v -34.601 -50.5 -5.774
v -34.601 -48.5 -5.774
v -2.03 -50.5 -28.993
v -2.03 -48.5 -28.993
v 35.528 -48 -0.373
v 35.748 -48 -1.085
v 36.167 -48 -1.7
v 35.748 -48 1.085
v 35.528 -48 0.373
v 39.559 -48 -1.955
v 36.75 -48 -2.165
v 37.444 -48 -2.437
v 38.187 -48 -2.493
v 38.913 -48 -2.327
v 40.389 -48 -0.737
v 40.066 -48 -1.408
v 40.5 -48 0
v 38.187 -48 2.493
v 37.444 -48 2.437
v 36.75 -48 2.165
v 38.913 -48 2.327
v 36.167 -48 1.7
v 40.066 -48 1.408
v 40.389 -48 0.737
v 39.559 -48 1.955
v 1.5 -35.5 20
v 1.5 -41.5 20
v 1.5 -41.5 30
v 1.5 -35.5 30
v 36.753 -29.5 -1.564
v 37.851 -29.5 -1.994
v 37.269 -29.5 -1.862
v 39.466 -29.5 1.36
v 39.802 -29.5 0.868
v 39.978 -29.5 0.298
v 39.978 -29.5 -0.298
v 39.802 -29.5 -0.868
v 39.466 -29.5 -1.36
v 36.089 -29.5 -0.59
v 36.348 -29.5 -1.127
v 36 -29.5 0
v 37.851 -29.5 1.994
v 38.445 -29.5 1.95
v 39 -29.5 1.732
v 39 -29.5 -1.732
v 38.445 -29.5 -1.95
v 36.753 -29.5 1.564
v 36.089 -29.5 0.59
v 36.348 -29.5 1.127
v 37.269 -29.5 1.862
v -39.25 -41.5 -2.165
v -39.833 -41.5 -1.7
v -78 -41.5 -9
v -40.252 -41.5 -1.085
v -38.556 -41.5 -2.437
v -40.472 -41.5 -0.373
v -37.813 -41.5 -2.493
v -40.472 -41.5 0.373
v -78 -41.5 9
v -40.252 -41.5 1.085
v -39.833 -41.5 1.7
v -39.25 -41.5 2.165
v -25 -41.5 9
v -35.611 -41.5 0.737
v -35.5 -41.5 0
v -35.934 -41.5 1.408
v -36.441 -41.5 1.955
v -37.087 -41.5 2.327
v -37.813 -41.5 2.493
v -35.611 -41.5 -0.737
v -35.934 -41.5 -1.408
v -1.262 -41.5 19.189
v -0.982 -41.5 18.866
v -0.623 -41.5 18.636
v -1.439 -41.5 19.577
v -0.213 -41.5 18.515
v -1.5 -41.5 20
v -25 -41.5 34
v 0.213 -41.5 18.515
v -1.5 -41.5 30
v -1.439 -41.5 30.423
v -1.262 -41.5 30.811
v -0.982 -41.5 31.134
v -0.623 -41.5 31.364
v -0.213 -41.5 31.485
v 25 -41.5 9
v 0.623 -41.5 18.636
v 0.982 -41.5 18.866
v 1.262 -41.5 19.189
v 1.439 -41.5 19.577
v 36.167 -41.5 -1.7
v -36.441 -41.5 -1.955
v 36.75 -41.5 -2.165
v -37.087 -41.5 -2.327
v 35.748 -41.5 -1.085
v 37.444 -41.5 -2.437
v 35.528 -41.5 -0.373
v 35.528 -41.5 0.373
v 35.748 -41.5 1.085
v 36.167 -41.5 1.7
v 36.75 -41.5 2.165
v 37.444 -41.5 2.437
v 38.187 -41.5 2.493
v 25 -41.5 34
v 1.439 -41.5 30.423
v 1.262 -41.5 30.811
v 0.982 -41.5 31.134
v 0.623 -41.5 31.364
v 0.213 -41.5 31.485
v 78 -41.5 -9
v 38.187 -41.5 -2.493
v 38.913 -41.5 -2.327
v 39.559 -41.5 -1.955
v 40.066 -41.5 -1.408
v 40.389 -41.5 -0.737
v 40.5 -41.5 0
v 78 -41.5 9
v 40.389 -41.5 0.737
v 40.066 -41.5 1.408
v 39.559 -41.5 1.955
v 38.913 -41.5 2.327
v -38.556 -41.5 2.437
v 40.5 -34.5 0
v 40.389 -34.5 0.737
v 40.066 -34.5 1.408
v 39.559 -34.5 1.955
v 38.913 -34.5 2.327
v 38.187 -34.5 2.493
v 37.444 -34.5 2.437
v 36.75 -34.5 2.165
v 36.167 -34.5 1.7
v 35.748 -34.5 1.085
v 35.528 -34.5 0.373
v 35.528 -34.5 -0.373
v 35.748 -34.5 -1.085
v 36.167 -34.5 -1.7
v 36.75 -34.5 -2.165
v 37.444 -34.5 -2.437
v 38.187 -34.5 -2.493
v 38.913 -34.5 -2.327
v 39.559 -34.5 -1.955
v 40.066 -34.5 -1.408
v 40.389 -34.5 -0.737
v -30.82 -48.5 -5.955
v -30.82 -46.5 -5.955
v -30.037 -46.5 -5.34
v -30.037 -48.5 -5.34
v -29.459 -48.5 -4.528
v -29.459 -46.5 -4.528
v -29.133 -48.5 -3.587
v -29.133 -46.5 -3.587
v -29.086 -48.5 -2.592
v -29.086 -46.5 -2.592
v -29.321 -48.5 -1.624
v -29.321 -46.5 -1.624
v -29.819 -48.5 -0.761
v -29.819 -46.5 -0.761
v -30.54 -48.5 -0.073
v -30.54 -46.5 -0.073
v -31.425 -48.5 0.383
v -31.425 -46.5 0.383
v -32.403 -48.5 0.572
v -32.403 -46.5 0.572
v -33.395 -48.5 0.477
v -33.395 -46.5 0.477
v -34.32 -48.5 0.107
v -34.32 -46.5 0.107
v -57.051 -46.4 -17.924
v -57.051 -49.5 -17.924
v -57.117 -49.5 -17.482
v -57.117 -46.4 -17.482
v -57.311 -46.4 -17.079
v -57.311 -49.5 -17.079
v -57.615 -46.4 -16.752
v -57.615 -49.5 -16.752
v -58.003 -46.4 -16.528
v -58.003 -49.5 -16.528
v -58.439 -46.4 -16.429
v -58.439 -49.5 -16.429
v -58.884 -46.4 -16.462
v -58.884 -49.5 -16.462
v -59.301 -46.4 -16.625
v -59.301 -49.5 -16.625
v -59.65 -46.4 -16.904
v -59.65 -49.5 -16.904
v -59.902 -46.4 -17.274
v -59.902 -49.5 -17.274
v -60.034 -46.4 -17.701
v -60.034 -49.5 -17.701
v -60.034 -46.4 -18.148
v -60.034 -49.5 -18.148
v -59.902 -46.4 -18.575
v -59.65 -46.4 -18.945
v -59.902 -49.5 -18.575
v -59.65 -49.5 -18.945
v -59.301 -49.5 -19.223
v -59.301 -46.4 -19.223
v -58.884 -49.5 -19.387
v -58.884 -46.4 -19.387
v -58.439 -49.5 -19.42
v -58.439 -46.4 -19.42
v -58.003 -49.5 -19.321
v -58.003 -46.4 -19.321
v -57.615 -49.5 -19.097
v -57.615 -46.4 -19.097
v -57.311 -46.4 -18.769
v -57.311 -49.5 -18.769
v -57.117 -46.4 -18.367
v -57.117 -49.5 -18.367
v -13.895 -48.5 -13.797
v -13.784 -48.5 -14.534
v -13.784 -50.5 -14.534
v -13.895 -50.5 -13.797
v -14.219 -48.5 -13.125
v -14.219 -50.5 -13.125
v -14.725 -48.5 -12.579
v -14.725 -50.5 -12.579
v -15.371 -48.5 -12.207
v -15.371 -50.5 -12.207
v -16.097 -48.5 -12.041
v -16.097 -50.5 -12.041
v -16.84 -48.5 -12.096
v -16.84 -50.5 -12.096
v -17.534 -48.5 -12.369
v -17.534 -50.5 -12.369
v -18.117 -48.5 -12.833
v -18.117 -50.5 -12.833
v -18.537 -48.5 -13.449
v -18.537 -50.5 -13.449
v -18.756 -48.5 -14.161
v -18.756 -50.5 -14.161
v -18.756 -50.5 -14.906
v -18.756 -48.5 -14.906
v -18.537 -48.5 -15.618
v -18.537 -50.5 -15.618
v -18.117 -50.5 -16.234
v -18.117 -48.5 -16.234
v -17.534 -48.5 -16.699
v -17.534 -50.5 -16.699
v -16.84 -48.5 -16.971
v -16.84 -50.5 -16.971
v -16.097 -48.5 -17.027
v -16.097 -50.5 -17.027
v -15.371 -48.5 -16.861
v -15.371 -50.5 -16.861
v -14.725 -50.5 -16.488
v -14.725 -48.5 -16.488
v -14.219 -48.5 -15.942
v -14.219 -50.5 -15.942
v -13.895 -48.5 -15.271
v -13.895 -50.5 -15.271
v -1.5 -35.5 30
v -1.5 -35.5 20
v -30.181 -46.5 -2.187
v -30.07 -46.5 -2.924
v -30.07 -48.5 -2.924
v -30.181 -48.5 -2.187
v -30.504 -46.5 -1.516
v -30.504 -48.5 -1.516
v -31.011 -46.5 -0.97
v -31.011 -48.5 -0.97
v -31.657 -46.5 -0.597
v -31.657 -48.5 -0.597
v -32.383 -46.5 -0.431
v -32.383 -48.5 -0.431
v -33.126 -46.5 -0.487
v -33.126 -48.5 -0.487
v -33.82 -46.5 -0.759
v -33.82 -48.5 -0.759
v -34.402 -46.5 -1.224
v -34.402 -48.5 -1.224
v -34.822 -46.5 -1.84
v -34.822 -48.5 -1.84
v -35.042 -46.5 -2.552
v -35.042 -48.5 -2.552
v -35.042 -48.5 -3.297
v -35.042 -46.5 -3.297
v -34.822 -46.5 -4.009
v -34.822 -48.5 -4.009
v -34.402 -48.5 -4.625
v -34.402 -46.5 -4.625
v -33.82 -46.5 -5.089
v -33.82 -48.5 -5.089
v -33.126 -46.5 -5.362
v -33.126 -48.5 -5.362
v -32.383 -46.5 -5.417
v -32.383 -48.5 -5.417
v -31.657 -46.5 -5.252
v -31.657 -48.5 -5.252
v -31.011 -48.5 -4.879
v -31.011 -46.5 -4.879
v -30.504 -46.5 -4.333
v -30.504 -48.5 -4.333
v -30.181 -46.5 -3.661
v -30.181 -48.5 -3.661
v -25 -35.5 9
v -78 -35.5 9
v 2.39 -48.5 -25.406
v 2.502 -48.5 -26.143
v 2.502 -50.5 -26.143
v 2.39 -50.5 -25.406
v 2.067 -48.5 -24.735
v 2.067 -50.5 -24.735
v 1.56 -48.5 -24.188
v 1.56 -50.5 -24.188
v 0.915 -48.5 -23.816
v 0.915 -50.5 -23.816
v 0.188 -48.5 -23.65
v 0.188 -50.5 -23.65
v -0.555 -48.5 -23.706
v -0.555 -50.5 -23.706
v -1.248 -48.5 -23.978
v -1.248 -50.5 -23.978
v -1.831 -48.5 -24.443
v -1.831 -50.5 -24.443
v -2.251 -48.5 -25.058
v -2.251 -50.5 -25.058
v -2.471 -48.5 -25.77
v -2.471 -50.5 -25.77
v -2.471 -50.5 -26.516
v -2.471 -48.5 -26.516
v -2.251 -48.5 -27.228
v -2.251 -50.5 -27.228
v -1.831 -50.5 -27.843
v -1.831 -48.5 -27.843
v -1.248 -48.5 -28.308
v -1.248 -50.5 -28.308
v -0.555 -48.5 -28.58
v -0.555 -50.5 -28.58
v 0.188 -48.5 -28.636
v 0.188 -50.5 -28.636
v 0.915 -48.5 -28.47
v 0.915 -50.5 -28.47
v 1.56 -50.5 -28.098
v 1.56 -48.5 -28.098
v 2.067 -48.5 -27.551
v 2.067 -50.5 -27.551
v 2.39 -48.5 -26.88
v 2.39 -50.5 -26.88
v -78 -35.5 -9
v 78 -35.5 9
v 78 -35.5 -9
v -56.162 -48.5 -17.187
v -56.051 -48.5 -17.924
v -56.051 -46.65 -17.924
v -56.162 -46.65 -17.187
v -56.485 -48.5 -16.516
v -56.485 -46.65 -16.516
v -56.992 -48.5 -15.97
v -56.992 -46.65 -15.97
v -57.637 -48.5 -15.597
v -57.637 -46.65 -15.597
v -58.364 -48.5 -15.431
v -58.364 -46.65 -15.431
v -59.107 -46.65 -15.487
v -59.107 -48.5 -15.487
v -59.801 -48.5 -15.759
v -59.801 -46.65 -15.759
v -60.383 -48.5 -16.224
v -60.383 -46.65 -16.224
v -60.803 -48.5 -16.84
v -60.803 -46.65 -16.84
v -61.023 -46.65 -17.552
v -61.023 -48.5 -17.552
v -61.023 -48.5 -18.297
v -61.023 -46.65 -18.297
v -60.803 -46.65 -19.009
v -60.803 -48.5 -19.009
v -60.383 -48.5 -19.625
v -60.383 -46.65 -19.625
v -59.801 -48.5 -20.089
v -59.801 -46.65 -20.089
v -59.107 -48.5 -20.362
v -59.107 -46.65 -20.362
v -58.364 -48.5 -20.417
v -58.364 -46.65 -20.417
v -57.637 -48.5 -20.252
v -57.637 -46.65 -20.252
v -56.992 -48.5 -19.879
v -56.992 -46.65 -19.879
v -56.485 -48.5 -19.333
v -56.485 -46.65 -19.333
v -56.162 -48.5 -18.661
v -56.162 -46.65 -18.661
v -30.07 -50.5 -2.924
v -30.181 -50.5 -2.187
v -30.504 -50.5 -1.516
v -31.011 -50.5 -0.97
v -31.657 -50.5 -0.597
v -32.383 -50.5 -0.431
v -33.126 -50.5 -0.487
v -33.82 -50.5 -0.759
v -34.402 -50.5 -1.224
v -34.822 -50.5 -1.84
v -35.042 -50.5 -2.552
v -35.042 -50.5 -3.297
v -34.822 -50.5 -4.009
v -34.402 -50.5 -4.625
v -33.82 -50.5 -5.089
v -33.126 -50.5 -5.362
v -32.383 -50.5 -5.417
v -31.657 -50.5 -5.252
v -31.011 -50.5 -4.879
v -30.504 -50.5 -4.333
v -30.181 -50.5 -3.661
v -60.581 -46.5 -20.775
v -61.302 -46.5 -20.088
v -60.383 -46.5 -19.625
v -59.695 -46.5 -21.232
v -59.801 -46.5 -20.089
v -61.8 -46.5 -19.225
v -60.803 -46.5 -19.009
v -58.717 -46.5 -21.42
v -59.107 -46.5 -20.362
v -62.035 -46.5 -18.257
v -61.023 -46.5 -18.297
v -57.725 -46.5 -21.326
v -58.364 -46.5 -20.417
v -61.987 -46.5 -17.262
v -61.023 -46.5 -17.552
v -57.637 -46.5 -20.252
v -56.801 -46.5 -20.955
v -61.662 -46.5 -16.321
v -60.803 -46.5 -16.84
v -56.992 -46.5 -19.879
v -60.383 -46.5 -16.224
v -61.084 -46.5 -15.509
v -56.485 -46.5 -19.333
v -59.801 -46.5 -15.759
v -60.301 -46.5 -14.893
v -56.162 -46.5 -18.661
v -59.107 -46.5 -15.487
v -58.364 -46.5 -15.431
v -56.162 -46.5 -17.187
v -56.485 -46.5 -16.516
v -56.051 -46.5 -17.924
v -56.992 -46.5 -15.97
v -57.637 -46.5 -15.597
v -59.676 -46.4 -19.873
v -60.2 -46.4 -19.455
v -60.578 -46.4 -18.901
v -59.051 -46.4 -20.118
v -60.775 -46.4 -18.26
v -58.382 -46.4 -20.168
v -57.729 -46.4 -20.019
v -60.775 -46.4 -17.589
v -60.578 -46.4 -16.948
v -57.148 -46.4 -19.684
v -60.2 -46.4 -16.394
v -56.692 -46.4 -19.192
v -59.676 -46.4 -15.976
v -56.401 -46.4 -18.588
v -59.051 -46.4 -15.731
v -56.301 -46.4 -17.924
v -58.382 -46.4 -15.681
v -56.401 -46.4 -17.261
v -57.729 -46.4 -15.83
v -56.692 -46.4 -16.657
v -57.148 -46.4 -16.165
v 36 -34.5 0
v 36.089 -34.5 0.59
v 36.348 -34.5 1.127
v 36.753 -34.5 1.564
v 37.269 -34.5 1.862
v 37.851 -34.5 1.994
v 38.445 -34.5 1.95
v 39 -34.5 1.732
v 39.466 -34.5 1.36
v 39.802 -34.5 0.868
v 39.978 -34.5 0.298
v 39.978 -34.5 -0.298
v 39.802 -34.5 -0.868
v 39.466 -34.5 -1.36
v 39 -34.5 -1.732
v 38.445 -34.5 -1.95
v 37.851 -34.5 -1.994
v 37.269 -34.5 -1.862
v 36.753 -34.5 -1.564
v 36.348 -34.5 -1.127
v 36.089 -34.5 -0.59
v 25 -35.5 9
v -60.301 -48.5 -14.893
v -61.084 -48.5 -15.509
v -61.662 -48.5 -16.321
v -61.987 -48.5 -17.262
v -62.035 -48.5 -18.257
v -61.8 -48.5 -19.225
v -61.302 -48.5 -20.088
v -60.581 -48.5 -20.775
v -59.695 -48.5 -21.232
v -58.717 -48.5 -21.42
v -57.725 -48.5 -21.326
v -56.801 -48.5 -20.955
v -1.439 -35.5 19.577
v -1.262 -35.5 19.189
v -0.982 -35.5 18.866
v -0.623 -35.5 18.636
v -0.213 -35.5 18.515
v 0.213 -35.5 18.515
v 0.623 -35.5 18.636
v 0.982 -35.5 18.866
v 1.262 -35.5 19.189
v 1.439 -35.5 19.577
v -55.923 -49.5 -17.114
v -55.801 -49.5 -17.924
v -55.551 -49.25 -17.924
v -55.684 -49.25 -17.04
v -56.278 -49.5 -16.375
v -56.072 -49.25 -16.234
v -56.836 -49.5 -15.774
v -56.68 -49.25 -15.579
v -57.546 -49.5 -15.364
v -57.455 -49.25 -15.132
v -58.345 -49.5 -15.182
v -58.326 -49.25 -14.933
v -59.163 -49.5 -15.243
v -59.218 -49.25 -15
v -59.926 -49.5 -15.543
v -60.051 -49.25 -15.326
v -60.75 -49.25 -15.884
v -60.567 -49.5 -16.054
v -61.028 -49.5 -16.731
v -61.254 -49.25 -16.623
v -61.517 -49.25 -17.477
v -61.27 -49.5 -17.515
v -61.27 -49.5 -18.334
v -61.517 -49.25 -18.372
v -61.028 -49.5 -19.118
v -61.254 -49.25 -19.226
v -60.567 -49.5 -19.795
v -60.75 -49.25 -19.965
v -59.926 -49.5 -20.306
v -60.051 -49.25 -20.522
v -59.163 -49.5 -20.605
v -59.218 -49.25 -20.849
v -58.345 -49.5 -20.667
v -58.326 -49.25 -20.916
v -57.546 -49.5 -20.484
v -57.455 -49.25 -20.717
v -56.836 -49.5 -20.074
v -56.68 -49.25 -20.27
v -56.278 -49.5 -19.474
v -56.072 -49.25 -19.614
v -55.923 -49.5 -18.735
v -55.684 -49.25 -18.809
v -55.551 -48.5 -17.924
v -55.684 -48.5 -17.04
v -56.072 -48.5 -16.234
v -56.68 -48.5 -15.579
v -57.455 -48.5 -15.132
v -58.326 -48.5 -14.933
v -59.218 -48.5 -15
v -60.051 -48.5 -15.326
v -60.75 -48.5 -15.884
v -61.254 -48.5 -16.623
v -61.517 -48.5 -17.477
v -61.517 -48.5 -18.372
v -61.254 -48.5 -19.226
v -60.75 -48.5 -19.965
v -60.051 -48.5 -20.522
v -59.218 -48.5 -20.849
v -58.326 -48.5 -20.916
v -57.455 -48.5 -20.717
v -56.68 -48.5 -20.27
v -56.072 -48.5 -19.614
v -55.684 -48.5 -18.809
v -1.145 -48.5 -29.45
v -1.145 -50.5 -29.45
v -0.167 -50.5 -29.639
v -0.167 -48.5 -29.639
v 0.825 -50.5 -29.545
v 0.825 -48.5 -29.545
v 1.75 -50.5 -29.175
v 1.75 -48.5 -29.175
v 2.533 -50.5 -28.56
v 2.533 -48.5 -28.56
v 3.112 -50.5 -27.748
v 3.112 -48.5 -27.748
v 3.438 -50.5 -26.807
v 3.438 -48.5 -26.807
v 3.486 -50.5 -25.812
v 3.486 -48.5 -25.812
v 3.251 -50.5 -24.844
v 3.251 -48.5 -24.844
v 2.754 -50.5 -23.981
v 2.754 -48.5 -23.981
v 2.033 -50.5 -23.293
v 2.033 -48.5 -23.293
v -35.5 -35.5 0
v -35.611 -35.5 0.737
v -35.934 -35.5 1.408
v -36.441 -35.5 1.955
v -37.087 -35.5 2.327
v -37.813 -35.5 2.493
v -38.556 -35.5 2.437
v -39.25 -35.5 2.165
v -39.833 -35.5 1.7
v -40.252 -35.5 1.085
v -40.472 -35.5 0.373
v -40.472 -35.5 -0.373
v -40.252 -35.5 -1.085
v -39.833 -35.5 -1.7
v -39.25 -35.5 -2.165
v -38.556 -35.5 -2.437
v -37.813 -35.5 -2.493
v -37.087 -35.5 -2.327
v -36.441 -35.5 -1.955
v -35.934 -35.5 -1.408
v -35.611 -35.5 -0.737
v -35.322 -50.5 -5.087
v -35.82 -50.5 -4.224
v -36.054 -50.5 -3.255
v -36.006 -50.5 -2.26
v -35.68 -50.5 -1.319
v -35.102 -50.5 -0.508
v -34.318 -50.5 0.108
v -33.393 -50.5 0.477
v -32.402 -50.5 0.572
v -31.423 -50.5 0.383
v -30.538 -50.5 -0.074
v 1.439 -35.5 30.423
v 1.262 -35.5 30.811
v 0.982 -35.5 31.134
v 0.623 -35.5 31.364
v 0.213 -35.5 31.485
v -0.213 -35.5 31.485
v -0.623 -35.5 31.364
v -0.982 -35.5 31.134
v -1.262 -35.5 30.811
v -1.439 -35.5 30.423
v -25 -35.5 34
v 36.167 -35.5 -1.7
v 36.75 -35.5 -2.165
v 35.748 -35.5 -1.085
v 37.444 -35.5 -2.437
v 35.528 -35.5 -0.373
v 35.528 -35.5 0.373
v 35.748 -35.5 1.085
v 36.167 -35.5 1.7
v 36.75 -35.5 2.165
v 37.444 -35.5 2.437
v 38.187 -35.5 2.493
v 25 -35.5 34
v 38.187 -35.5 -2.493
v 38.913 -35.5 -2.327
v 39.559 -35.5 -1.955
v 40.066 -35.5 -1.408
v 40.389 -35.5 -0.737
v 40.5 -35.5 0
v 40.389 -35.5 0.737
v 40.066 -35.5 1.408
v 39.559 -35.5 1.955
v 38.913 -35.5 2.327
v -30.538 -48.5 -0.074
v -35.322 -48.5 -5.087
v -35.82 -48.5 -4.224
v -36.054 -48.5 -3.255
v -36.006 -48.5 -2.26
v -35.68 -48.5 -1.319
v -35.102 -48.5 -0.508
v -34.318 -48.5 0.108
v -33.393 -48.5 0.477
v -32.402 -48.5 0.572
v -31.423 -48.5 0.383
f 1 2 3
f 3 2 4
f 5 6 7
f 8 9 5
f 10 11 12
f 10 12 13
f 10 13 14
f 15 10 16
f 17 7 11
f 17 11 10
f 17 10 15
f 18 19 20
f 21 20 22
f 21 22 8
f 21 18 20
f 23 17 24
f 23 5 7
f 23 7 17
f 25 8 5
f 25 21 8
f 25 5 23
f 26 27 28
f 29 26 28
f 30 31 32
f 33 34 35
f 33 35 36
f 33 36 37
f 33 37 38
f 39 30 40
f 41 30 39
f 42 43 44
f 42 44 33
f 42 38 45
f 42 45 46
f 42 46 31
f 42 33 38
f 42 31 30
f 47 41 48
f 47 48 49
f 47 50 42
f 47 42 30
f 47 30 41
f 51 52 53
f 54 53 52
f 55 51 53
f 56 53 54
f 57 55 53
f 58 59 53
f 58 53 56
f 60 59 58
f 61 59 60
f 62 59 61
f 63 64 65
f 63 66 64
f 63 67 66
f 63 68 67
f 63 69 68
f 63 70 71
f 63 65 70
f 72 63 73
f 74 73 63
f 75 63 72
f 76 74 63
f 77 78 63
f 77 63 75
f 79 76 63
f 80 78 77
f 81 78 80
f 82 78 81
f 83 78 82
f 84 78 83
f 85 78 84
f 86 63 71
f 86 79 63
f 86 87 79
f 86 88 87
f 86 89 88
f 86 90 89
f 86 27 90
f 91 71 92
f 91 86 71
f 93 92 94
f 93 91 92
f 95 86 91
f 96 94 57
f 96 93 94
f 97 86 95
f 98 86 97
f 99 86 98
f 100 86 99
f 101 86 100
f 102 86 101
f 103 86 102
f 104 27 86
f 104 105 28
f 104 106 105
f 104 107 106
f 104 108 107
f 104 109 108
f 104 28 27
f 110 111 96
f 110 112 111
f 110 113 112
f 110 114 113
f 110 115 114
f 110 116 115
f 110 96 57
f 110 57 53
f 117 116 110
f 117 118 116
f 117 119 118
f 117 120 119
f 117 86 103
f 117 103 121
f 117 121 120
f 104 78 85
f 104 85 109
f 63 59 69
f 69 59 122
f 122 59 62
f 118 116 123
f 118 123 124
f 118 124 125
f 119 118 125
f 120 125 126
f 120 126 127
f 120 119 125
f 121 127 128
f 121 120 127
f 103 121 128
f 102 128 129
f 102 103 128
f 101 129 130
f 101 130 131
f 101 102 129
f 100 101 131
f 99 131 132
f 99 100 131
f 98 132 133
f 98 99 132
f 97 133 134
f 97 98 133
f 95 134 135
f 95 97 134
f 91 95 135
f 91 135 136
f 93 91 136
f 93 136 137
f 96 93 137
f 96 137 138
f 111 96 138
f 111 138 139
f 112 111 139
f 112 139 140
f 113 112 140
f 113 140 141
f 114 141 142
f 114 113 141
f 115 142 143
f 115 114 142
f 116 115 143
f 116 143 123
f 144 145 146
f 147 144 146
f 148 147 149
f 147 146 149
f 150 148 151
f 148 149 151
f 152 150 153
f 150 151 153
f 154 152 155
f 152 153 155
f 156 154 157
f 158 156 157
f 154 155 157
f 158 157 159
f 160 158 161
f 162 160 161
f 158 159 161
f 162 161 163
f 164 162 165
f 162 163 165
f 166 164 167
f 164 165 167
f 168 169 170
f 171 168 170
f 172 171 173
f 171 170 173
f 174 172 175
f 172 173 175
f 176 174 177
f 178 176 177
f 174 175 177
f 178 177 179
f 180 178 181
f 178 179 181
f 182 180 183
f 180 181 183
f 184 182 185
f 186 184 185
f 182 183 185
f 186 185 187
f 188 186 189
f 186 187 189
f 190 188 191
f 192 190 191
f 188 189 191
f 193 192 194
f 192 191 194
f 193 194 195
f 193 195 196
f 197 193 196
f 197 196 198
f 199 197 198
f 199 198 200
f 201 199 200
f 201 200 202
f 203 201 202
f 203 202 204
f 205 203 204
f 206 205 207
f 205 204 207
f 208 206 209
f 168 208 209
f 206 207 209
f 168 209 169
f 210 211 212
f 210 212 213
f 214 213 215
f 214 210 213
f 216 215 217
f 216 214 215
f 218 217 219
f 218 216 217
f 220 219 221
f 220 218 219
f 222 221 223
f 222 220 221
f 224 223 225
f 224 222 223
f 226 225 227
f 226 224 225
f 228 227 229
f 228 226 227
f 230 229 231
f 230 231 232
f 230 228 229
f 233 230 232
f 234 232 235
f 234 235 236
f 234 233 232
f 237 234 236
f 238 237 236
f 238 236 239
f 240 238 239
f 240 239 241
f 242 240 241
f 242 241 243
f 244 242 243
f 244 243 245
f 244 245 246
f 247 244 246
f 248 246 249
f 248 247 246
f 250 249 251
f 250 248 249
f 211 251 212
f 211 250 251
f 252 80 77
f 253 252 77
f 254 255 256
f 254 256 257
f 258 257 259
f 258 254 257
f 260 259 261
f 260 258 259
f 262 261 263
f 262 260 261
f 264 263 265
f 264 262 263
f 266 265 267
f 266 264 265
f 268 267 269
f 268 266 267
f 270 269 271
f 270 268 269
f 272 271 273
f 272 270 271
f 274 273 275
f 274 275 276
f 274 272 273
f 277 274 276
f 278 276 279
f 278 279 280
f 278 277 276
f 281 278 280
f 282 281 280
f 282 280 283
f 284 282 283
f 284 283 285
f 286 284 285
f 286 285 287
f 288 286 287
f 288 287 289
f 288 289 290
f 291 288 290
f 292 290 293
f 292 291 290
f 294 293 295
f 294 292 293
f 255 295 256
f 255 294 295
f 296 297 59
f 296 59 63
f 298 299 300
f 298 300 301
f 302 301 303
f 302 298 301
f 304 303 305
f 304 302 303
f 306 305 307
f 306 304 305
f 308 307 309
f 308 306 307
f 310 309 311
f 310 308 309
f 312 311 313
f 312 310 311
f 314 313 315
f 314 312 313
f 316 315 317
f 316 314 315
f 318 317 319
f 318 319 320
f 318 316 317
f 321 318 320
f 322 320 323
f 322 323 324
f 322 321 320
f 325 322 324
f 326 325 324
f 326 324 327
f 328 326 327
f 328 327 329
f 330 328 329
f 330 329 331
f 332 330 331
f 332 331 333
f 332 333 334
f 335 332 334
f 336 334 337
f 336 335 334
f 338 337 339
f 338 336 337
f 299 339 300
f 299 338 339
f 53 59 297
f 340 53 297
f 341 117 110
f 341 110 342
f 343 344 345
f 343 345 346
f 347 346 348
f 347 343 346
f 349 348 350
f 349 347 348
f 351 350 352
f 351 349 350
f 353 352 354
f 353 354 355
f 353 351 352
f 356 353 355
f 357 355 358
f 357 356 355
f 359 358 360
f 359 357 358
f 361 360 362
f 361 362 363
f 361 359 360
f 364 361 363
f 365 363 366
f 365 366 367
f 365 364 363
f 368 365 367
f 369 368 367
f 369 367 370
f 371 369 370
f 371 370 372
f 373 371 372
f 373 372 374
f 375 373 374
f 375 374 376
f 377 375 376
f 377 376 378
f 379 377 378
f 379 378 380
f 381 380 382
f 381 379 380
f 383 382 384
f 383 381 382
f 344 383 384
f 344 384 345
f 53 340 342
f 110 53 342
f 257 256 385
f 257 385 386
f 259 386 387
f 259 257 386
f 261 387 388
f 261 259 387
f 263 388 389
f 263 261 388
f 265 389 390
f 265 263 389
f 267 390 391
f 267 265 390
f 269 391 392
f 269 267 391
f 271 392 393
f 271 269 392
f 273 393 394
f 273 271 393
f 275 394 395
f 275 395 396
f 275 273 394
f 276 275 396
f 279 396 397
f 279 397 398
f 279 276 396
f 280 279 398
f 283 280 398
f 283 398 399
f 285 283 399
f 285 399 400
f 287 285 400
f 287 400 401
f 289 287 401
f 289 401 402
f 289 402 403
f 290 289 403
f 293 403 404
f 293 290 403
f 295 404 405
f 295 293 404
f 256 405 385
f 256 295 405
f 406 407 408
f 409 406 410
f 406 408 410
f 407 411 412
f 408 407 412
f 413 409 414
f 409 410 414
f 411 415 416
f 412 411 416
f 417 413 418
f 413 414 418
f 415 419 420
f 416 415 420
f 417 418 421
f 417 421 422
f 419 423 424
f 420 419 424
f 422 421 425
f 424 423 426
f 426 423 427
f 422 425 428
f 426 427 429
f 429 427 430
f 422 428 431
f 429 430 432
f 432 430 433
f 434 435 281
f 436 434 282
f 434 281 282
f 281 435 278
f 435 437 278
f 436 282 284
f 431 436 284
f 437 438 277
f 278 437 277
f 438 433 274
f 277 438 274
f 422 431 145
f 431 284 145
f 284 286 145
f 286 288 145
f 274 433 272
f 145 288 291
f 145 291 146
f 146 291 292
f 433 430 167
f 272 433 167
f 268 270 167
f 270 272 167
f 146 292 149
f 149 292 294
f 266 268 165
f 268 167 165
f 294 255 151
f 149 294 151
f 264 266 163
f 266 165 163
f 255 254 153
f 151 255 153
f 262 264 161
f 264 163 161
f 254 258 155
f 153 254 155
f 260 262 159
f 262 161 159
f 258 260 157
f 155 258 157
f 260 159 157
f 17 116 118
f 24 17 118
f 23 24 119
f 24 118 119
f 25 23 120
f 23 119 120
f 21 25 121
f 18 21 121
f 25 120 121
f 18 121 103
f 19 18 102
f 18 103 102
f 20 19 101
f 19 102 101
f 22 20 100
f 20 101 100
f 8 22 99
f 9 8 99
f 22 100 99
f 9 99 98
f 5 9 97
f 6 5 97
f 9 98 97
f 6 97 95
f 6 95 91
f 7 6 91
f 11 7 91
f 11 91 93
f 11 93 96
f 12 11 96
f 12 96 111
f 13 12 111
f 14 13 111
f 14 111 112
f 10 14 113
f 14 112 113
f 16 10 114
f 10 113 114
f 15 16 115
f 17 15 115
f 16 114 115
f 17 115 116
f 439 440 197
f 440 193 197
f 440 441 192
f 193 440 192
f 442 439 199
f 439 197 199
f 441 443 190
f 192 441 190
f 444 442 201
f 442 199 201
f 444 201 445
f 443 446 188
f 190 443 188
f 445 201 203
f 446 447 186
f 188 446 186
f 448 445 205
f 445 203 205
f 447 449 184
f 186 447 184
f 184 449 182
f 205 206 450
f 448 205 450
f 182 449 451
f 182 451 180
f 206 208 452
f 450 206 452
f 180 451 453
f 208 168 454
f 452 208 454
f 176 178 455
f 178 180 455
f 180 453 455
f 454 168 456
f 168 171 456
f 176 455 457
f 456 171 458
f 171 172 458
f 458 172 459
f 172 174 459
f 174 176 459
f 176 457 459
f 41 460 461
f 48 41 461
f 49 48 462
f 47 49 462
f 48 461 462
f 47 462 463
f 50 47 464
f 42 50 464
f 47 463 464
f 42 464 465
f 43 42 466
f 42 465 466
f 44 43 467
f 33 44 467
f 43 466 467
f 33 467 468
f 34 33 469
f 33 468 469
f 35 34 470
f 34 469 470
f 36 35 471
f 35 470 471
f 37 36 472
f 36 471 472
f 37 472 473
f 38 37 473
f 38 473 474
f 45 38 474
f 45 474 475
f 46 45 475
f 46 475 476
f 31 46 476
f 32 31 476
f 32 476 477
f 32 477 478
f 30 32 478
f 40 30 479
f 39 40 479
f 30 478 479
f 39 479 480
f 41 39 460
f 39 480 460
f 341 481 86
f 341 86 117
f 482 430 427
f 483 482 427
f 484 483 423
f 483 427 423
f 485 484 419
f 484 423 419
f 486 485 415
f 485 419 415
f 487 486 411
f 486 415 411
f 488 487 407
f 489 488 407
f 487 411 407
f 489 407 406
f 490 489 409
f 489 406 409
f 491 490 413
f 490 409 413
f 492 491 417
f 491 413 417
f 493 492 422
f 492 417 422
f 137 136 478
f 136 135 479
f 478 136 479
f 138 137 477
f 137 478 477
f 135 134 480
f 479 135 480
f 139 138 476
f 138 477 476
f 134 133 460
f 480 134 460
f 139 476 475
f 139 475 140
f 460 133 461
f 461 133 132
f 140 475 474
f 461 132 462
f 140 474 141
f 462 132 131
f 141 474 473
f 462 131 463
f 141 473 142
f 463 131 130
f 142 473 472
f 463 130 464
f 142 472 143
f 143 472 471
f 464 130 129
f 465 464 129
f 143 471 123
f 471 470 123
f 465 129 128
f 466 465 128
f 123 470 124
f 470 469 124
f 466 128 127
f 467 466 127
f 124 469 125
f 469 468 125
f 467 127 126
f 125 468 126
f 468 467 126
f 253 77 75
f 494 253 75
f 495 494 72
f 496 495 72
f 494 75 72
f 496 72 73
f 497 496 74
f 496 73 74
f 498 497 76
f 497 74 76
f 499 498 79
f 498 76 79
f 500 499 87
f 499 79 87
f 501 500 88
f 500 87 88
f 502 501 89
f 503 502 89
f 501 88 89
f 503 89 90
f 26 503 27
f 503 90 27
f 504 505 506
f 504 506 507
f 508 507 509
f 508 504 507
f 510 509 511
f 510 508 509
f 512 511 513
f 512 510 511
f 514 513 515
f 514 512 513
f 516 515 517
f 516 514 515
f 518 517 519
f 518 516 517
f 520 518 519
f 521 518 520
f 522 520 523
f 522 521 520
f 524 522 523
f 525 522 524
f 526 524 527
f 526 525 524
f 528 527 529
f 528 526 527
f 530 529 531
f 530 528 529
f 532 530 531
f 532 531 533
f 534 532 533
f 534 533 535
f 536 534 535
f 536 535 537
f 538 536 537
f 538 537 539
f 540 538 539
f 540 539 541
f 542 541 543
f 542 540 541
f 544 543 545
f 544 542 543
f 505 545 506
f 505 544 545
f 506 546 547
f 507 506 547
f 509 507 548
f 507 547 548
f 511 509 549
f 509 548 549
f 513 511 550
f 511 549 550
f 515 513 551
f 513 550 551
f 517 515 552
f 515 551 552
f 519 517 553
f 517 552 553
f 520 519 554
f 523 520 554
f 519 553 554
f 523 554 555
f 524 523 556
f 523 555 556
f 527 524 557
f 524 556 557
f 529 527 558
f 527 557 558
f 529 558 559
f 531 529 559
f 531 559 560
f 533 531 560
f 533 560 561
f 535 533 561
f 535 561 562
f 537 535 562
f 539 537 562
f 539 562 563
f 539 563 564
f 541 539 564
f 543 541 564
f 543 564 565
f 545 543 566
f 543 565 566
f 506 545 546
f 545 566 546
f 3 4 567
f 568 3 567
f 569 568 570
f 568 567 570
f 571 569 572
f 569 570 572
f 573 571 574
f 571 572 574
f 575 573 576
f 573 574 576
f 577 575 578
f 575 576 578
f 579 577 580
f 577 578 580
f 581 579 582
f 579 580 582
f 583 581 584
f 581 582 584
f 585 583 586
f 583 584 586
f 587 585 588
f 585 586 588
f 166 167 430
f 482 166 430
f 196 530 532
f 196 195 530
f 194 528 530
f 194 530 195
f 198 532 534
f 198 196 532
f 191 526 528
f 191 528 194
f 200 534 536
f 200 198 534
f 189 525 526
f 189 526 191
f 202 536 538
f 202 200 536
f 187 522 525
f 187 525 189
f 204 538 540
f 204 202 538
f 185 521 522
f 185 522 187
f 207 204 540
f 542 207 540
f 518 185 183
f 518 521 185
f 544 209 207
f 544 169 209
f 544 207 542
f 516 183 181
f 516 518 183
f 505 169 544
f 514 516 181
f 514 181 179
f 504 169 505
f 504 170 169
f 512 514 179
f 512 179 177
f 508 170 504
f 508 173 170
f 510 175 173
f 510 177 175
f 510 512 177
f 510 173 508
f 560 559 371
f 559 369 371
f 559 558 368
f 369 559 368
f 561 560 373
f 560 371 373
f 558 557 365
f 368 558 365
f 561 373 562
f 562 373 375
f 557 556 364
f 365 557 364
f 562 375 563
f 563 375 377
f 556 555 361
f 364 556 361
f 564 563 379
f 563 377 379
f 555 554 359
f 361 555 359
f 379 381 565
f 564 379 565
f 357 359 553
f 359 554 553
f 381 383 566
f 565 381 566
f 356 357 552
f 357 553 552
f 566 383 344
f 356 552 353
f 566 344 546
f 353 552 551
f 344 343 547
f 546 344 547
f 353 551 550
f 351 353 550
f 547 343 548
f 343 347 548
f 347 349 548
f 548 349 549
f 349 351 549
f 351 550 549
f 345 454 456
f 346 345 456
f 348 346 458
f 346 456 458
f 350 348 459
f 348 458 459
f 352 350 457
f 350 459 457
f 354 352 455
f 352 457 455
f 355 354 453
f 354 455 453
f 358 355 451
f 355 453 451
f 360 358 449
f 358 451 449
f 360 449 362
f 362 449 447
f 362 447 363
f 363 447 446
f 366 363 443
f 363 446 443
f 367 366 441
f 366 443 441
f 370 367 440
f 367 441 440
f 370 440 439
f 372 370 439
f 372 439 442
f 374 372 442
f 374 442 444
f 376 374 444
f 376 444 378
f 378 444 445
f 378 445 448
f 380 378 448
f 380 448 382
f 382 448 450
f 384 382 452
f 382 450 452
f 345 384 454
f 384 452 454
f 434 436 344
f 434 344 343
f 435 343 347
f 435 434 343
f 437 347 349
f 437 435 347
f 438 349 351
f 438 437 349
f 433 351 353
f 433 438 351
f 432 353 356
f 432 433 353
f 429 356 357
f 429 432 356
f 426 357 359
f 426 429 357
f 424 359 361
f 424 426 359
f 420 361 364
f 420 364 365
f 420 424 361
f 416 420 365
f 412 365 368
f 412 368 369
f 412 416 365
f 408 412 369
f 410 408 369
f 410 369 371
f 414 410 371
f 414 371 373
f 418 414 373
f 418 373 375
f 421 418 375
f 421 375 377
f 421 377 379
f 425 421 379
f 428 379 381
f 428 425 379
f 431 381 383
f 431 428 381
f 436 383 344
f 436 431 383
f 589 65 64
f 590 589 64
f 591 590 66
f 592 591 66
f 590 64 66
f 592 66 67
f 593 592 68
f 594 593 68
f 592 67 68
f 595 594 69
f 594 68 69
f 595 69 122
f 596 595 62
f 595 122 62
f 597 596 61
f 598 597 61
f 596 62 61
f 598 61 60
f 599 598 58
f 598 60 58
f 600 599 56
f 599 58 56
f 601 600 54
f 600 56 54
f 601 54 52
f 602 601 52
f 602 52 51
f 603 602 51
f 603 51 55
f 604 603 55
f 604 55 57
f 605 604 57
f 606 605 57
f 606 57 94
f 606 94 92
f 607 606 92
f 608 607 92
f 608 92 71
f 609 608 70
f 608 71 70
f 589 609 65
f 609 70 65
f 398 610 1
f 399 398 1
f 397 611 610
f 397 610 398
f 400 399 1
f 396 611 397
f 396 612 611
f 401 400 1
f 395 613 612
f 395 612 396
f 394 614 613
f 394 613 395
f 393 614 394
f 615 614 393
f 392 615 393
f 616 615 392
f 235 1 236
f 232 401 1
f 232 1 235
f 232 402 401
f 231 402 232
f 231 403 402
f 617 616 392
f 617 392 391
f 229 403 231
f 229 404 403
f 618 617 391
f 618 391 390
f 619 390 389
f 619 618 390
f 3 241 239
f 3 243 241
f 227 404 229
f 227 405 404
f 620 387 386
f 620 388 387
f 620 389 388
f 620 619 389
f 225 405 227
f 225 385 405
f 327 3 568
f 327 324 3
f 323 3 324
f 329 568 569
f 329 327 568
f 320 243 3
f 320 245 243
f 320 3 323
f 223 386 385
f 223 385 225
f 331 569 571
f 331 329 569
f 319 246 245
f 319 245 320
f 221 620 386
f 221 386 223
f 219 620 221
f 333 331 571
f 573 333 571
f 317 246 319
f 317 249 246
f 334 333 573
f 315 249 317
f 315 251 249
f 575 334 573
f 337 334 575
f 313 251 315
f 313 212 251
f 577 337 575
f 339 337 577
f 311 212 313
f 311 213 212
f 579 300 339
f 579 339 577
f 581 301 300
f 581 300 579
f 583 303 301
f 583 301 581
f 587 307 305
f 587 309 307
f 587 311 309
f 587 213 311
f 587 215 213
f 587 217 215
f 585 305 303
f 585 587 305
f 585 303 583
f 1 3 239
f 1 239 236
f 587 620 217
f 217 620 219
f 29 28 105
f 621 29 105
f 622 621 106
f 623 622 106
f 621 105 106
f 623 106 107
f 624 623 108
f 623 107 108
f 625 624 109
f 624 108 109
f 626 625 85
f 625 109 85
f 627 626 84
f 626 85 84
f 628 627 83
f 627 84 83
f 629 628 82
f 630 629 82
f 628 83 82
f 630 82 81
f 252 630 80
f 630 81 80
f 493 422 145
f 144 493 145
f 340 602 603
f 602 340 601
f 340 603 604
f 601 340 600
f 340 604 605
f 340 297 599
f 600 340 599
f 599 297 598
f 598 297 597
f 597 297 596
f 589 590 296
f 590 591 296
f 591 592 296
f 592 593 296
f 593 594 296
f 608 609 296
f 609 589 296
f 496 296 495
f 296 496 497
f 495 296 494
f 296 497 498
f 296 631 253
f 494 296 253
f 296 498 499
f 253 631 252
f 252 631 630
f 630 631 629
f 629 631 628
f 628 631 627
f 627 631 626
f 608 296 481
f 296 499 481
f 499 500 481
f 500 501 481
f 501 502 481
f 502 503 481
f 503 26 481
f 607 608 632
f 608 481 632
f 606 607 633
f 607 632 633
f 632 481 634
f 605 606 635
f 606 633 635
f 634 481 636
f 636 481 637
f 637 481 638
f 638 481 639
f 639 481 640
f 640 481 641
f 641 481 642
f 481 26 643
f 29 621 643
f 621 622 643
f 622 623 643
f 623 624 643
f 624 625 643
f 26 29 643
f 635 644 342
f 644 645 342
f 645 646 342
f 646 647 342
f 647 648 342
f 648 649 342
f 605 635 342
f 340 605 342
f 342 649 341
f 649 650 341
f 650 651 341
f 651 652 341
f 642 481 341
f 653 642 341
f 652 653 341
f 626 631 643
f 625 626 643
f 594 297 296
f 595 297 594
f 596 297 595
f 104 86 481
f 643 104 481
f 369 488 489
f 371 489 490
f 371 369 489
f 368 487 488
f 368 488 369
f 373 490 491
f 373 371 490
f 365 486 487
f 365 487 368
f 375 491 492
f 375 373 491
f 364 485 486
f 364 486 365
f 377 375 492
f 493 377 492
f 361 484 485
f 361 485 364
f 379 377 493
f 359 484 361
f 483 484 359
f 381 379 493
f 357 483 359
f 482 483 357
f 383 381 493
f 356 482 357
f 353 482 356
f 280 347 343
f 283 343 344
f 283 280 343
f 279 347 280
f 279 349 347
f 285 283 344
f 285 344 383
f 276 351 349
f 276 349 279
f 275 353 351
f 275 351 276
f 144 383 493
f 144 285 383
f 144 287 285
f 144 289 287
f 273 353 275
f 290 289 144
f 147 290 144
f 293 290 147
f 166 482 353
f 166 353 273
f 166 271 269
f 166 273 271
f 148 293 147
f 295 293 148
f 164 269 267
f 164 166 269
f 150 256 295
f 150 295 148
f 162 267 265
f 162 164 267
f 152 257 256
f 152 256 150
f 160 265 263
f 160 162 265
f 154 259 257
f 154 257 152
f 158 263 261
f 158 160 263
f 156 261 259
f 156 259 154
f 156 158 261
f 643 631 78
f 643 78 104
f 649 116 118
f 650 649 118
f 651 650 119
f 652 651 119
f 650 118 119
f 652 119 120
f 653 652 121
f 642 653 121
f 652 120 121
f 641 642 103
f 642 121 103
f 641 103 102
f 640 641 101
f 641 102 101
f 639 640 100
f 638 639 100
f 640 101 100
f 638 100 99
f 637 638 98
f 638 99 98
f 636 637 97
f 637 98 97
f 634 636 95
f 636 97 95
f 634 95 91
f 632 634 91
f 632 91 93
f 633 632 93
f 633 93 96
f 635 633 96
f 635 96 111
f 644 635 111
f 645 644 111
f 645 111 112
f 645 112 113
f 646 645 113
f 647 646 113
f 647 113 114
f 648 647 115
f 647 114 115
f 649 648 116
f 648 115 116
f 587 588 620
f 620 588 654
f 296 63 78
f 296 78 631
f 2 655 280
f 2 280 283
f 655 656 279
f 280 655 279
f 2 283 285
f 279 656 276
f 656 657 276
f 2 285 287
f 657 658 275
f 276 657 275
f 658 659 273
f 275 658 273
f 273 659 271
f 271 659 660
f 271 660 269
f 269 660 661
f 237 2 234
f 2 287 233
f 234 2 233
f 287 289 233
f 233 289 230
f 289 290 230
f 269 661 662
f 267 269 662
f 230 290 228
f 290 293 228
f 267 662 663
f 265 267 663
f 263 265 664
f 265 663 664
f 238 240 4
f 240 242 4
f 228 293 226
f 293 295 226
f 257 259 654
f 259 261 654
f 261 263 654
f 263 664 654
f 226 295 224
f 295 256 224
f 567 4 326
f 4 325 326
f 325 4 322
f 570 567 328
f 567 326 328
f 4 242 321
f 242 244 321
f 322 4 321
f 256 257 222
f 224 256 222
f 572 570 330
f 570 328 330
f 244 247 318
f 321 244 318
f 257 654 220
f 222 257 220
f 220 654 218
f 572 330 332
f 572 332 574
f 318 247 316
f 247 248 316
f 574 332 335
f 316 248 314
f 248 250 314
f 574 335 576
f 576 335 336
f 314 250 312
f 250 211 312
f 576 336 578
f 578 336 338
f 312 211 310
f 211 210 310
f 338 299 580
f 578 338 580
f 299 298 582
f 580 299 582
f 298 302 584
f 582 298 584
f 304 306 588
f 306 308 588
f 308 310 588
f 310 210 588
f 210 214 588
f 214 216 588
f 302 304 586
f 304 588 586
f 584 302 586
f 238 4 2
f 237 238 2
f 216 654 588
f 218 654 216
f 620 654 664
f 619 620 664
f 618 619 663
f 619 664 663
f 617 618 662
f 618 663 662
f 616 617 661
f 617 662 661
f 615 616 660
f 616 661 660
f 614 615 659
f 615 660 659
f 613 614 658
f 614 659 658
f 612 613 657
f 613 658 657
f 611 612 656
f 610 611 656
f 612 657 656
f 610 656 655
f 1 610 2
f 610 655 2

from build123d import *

# Parameters (mm, degrees)
F0_W      = 156
F0_H      = 6
F1_DEPTH  = 9
F2_R      = 2.5
F3_DEPTH  = 6
F5_R      = 2.5
F6_DEPTH  = 7
F7_R      = 2
F8_DEPTH  = 5
F9_R      = 2.5
F10_DEPTH = 6.5
F11_W     = 50
F11_H     = 6
F12_DEPTH = 25
F14_DEPTH = 6
F15_R     = 2.5
F16_DEPTH = 2
F17_R     = 2.5
F18_DEPTH = 2
F20_R     = 2.5
F21_DEPTH = 2.1
F22_R     = 3
F23_DEPTH = 1
F24_R     = 1.5
F25_DEPTH = 3.1
F26_SIZE  = 0.25


with BuildPart() as f1:
    # F0 (on Top) → F1 (new body, symmetric)
    with BuildSketch(Plane.XY):
        with Locations((0, -38.5)):
            Rectangle(F0_W, F0_H)
    extrude(amount=F1_DEPTH, both=True)

    # F2 (on face) → F3 (cut, through all)
    with BuildSketch(Plane.XZ.offset(41.5)):
        with Locations((-38, 0)):
            Circle(F2_R)
        with Locations((38, 0)):
            Circle(F2_R)
    extrude(amount=-F3_DEPTH, mode=Mode.SUBTRACT)

    # F11 (on face) → F12 (join)
    with BuildSketch(Plane.XY.offset(9)):
        with Locations((0, -38.5)):
            Rectangle(F11_W, F11_H)
    extrude(amount=F12_DEPTH)

    # F13 (on face) → F14 (cut, through all)
    with BuildSketch(Plane.XZ.offset(41.5)):
        with BuildLine():
            ThreePointArc((1.5, 30), (0, 31.5), (-1.5, 30))
            Line((-1.5, 30), (-1.5, 20))
            ThreePointArc((-1.5, 20), (0, 18.5), (1.5, 20))
            Line((1.5, 20), (1.5, 30))
        make_face()
    extrude(amount=-F14_DEPTH, mode=Mode.SUBTRACT)


with BuildPart() as f6:
    # F5 (on face) → F6 (new body)
    with BuildSketch(Plane.XZ.offset(41.5)):
        with Locations((38, 0)):
            Circle(F5_R)
    extrude(amount=-F6_DEPTH)

    # F7 (on face) → F8 (join)
    with BuildSketch(Plane(origin=(0, -34.5, 0), x_dir=(-1, 0, 0), z_dir=(0, 1, 0))):
        with Locations((-38, 0)):
            Circle(F7_R)
    extrude(amount=F8_DEPTH)

    # F9 (on face) → F10 (join)
    with BuildSketch(Plane.XZ.offset(41.5)):
        with Locations((38, 0)):
            Circle(F9_R)
    extrude(amount=F10_DEPTH)


with BuildPart() as f16:
    # F15 (on offset) → F16 (new body)
    with BuildSketch(Plane.XZ.offset(46.5)):
        with BuildLine():
            ThreePointArc((-60.3006148636, -14.8932962321), (-61.5817037769, -19.6743851453), (-56.8006148636, -20.9554740586))
            Line((-56.8006148636, -20.9554740586), (-30.8198527501, -5.9554740586))
            ThreePointArc((-30.8198527501, -5.9554740586), (-29.5387638369, -1.1743851453), (-34.3198527501, 0.1067037679))
            Line((-34.3198527501, 0.1067037679), (-60.3006148636, -14.8932962321))
        make_face()
        with Locations((-58.5506148636, -17.9243851453)):
            Circle(F15_R, mode=Mode.SUBTRACT)
        with Locations((-32.5698527501, -2.9243851453)):
            Circle(F15_R, mode=Mode.SUBTRACT)
    extrude(amount=F16_DEPTH)


with BuildPart() as f18:
    # F17 (on face) → F18 (new body)
    with BuildSketch(Plane.XZ.offset(48.5)):
        with BuildLine():
            ThreePointArc((-30.5382201412, -0.074390594), (-35.4198473014, -0.8927525364), (-34.601485359, -5.7743796966))
            Line((-34.601485359, -5.7743796966), (-2.0301190581, -28.9930380836))
            ThreePointArc((-2.0301190581, -28.9930380836), (2.8515081021, -28.1746761412), (2.0331461597, -23.293048981))
            Line((2.0331461597, -23.293048981), (-30.5382201412, -0.074390594))
        make_face()
        with Locations((0.0015135508, -26.1430435323)):
            Circle(F17_R, mode=Mode.SUBTRACT)
        with Locations((-32.5698527501, -2.9243851453)):
            Circle(F17_R, mode=Mode.SUBTRACT)
        with Locations((-16.2841695997, -14.5337143388)):
            Circle(F17_R, mode=Mode.SUBTRACT)
    extrude(amount=F18_DEPTH)


with BuildPart() as f21:
    # F20 (on face) → F21 (new body)
    with BuildSketch(Plane.XZ.offset(48.5)):
        with Locations((-58.5506148636, -17.9243851453)):
            Circle(F20_R)
    extrude(amount=-F21_DEPTH)

    # F22 (on face) → F23 (join)
    with BuildSketch(Plane.XZ.offset(48.5)):
        with Locations((-58.5506148636, -17.9243851453)):
            Circle(F22_R)
    extrude(amount=F23_DEPTH)

    # F24 (on face) → F25 (cut, through all)
    with BuildSketch(Plane.XZ.offset(49.5)):
        with Locations((-58.5506148636, -17.9243851453)):
            Circle(F24_R)
    extrude(amount=-F25_DEPTH, mode=Mode.SUBTRACT)

    # F26
    f26_edges = [f21.edges().sort_by_distance(p)[0] for p in [
        (-61.550615, -49.5, -17.924385),
        (-61.050615, -46.4, -17.924385),
    ]]
    chamfer(f26_edges, length=F26_SIZE)


solid = Compound([f1.part, f6.part, f16.part, f18.part, f21.part])
